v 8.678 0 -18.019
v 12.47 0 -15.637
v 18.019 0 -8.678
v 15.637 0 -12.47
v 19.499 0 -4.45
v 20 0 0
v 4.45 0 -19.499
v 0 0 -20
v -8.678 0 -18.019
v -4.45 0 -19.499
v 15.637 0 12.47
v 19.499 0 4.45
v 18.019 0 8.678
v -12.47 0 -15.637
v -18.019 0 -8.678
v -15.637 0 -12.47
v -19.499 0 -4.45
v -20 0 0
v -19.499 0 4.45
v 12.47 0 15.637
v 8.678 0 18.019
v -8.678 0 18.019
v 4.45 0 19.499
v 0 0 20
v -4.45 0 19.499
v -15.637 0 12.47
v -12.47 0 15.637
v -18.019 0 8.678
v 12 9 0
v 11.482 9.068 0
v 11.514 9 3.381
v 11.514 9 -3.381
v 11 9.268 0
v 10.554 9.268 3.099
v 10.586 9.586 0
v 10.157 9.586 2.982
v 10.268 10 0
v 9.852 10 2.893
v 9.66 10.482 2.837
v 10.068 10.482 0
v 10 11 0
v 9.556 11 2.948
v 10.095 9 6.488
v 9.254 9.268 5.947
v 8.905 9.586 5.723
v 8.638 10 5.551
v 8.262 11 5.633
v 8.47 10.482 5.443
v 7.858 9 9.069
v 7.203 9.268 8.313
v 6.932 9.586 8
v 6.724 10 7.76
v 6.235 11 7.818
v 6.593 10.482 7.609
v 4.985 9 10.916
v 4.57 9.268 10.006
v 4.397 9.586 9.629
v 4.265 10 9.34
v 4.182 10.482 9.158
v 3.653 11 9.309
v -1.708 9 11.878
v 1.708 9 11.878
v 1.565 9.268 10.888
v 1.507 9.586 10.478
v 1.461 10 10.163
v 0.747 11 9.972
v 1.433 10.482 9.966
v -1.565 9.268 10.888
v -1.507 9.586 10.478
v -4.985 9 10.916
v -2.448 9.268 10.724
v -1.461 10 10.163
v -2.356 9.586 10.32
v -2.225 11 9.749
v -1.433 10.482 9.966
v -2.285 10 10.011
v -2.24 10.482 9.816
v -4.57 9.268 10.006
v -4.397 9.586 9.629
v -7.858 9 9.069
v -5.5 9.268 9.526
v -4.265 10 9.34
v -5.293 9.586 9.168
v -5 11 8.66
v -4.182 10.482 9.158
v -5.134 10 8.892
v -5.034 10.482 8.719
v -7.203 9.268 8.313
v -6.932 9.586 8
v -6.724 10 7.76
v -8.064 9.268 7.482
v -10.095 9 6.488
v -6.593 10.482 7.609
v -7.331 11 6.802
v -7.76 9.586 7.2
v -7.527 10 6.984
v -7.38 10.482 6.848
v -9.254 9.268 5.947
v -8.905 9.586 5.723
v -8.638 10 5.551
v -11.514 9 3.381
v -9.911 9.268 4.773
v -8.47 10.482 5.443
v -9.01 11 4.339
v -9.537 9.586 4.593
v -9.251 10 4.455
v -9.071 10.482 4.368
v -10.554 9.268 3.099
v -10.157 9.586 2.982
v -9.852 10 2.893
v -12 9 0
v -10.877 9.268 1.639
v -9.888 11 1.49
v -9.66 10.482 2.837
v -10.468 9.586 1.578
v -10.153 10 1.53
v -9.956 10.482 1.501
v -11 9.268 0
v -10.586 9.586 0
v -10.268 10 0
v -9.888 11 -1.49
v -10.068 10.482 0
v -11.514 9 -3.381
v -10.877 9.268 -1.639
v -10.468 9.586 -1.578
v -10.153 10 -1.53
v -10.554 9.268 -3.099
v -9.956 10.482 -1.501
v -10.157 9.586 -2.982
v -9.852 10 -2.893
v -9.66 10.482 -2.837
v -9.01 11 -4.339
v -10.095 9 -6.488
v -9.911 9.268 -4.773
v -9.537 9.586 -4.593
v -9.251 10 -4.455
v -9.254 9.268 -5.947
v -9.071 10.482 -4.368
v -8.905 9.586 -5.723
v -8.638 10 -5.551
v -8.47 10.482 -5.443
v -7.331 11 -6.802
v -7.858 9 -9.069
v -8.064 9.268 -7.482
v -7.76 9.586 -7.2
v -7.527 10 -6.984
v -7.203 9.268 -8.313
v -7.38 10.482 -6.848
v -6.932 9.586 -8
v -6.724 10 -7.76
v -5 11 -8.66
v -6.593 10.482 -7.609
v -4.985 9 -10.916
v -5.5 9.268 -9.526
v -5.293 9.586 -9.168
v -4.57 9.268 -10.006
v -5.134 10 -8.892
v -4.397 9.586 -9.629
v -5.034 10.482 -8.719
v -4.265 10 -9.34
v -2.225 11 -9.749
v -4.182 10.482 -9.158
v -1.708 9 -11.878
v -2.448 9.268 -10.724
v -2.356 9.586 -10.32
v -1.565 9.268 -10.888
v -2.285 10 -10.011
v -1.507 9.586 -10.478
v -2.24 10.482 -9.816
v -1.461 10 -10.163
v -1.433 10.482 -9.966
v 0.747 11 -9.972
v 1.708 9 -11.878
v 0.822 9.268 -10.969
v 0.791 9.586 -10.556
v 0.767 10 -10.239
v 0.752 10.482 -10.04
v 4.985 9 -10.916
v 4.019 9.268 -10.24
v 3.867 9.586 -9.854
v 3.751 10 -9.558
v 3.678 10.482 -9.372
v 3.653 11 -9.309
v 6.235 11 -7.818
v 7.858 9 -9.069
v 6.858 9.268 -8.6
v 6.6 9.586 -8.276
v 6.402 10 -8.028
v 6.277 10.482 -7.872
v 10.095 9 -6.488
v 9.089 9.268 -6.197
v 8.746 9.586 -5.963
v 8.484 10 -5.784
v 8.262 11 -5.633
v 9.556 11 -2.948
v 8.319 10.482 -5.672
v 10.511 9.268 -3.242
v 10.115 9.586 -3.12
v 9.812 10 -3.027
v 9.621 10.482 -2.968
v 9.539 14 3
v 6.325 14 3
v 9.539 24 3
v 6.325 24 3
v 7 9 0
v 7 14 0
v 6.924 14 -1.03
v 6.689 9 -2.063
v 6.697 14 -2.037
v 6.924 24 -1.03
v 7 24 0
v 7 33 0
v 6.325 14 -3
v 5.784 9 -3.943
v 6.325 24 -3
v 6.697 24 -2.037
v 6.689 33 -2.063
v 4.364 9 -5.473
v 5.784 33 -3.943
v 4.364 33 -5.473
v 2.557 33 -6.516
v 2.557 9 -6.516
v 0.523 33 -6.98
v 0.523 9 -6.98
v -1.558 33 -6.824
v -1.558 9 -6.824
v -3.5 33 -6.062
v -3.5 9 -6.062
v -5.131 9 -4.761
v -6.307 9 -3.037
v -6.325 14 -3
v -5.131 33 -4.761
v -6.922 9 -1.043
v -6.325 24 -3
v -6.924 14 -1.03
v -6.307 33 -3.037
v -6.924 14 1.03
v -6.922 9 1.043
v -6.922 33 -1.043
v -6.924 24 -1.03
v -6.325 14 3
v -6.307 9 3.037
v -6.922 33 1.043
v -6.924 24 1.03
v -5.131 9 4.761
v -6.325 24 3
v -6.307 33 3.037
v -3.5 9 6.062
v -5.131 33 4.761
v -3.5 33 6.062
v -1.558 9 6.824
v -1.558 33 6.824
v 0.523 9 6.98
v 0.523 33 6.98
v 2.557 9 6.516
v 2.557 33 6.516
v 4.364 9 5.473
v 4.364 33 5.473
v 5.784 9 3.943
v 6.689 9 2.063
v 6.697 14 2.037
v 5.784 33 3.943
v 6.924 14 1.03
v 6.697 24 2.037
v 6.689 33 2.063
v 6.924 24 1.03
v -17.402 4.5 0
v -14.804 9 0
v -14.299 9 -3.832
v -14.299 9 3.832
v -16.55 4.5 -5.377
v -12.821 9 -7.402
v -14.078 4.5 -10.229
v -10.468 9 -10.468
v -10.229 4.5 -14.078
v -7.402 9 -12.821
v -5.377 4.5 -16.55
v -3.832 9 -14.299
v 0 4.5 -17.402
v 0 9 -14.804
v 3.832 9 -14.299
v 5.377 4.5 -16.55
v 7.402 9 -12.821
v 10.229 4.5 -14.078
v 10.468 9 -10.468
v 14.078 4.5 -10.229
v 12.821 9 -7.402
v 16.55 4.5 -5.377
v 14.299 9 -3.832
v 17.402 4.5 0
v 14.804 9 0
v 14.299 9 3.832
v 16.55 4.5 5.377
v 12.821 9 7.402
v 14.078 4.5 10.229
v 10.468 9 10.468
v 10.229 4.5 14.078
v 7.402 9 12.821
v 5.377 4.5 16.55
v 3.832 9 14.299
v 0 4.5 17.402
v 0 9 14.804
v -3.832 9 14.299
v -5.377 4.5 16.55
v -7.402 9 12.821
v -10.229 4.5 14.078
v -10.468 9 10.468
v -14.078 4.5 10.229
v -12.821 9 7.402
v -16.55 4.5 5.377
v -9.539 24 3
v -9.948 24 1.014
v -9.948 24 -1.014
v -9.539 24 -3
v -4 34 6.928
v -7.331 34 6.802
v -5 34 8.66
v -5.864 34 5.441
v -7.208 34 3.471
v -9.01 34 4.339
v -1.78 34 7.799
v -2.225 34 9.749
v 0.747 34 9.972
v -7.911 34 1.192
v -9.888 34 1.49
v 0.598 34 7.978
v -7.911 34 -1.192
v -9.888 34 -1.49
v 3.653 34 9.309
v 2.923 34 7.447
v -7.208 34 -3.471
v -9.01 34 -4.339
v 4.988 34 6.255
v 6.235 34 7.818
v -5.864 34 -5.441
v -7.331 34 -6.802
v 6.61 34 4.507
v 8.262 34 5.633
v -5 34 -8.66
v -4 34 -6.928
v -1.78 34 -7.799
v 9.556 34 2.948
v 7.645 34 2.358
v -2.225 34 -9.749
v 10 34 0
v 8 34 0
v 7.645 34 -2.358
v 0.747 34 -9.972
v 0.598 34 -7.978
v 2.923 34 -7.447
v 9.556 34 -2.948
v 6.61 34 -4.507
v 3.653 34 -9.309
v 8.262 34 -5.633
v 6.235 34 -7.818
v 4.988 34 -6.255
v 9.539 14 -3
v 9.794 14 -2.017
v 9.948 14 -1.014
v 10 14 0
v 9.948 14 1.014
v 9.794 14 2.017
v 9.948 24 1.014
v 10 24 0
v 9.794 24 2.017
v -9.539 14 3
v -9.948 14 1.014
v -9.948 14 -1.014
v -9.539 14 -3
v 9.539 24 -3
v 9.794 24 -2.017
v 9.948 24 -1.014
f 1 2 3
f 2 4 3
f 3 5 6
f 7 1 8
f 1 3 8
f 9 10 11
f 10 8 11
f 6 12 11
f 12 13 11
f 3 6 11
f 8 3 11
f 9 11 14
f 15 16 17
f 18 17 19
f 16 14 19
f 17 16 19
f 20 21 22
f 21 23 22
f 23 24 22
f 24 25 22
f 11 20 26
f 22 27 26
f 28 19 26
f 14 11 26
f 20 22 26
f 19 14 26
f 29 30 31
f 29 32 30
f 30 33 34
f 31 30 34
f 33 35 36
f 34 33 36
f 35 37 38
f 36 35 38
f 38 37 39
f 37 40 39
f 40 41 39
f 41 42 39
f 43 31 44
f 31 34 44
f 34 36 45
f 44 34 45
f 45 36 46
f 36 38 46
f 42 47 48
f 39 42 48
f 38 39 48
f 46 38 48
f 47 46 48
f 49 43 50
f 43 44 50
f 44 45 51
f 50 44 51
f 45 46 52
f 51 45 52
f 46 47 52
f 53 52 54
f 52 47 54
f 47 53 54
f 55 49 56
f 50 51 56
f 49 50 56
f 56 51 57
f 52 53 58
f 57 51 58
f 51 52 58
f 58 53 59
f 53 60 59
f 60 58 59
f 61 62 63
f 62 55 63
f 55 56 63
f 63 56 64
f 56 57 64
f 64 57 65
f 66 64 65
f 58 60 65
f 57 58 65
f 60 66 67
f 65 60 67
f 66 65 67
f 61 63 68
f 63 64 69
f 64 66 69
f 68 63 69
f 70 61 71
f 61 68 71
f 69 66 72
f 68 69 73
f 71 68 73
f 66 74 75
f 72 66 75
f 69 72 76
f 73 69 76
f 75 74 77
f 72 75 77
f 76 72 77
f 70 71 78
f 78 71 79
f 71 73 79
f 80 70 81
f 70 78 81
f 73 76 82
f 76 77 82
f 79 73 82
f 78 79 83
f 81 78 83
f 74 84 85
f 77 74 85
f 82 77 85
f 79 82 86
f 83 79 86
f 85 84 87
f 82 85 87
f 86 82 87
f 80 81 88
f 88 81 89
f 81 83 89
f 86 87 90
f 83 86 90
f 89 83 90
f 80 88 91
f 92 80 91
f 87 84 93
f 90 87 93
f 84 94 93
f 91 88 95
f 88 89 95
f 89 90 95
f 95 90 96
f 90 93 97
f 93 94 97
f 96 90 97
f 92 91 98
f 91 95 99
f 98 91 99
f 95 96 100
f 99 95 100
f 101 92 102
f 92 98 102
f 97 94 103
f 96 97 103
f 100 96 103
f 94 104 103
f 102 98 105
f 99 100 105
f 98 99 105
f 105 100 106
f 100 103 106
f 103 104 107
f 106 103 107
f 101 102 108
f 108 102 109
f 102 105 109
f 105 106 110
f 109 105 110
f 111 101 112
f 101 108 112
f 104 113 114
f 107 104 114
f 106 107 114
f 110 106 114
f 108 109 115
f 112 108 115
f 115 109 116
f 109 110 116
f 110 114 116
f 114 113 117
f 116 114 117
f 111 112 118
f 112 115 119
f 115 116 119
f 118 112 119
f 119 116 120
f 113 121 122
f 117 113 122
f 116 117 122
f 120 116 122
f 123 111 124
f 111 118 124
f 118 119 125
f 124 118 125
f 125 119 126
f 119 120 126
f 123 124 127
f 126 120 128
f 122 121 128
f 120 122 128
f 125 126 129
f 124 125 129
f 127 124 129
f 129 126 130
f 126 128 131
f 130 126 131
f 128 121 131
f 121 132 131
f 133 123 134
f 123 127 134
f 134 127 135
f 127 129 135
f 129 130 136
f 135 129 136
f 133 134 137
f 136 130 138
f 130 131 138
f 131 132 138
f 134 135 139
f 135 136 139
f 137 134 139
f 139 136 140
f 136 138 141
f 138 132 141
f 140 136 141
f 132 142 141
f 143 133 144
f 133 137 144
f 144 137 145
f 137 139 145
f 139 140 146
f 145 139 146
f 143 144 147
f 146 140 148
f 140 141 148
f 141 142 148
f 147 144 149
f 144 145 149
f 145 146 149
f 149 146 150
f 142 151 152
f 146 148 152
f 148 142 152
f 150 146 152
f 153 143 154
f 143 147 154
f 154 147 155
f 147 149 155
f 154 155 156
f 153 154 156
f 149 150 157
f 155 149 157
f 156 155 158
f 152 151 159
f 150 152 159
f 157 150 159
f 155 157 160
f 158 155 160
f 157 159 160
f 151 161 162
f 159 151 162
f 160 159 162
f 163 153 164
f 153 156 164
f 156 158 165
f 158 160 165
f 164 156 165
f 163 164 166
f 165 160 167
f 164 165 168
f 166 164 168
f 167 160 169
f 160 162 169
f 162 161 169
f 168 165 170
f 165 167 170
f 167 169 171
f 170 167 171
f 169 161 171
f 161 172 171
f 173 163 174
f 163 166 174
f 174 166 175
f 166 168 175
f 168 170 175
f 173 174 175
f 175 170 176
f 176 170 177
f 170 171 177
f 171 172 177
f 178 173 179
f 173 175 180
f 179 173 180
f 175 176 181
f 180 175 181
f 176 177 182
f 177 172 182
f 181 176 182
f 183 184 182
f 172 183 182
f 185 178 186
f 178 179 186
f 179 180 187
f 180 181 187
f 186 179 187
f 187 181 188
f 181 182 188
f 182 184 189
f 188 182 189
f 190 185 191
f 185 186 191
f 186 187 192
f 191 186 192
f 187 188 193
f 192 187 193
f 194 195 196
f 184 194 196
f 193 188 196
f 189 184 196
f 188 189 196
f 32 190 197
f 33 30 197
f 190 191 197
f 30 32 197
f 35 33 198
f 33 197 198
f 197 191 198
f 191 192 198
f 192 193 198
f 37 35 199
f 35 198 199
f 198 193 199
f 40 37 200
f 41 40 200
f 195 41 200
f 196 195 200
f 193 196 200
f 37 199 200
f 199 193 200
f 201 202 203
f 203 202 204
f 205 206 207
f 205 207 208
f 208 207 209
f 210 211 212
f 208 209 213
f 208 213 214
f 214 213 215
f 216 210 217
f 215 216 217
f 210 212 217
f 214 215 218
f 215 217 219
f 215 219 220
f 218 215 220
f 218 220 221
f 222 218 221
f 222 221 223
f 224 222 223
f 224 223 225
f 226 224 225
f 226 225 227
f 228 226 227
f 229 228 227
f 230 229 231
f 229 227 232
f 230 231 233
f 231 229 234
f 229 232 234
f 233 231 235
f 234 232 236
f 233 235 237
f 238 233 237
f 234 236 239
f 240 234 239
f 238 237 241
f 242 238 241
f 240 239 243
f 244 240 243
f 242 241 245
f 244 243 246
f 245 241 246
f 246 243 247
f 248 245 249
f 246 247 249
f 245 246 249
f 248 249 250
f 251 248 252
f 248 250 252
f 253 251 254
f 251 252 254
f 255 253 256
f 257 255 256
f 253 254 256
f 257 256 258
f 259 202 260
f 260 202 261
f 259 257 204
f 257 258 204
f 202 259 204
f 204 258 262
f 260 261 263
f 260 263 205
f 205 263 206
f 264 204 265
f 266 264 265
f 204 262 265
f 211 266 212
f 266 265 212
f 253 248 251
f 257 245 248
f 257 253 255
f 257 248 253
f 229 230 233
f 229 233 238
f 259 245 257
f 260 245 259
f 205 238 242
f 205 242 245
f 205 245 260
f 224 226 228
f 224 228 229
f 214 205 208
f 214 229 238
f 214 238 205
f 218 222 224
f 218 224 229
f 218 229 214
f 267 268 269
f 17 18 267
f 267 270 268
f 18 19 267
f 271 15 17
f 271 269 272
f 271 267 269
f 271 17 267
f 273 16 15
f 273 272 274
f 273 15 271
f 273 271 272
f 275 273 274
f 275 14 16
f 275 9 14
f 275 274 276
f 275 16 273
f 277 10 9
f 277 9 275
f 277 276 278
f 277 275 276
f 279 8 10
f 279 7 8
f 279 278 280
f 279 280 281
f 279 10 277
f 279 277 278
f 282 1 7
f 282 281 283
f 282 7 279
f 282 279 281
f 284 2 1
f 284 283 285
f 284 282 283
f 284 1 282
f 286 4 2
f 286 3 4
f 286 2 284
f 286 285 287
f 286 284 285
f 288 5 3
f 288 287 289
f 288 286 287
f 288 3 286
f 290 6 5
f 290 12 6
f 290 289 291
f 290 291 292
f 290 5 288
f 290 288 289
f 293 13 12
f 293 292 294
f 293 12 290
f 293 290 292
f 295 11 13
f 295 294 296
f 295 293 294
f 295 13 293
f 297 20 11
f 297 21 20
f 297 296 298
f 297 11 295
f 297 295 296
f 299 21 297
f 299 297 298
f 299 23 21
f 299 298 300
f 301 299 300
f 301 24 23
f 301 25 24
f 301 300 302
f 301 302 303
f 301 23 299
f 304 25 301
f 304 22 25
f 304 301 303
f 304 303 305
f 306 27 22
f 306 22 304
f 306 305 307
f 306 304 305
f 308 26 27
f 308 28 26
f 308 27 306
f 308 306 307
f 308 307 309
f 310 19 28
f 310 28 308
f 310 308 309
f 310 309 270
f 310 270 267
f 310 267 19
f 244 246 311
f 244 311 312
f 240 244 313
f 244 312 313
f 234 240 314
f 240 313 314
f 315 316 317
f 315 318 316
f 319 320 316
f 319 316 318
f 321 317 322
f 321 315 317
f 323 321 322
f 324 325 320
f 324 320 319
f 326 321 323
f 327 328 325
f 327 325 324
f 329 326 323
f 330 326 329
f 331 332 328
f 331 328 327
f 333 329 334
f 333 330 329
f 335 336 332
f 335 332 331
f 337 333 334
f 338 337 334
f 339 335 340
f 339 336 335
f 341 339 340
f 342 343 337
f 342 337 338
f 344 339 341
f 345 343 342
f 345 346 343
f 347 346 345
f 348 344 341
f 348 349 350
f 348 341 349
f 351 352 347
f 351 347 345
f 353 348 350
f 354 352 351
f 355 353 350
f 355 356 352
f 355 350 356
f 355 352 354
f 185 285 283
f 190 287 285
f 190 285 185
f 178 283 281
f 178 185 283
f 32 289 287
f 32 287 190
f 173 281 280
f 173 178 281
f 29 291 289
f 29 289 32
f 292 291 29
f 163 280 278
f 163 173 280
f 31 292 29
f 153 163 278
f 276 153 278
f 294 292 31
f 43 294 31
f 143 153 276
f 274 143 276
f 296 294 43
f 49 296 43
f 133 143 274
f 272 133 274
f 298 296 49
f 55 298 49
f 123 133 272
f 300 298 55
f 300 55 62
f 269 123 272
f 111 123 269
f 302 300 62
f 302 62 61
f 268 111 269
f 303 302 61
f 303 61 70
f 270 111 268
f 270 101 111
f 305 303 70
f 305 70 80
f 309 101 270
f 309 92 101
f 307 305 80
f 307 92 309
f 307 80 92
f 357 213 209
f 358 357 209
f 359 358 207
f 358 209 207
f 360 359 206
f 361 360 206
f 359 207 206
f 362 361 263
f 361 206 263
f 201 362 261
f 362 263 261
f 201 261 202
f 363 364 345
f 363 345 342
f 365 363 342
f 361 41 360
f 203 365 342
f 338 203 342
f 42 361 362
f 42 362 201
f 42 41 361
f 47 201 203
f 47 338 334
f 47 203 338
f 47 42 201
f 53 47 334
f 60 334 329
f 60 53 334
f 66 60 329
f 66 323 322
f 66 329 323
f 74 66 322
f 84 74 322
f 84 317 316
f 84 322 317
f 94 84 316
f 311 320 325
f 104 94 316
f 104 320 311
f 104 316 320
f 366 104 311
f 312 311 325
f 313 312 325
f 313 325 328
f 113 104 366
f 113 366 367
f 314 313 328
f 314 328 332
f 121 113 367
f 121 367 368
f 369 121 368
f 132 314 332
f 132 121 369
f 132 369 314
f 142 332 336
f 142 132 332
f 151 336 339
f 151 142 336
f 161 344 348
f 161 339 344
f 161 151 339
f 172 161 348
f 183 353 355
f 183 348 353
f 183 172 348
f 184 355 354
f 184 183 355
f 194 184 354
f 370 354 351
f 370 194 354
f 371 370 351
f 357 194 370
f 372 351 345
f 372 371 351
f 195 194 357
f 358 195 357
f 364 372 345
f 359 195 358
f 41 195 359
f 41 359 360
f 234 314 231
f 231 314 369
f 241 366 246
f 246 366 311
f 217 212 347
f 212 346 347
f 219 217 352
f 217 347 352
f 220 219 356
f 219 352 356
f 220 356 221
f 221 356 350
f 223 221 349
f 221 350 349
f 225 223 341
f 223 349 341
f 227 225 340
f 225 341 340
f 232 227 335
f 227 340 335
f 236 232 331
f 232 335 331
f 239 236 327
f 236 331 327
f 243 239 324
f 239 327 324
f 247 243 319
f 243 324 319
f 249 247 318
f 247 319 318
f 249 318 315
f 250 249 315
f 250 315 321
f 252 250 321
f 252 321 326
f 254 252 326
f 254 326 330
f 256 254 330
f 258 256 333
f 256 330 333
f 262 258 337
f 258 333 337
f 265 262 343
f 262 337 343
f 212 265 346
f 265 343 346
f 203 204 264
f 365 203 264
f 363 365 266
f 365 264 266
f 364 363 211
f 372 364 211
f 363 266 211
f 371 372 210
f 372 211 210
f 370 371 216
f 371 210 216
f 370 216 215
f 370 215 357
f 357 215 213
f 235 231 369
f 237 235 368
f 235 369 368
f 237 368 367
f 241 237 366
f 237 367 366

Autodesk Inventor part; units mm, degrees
ref_plane "YZ Plane" through (0, 0, 0) normal (1, 0, 0) x (0, 1, 0)
ref_plane "XZ Plane" through (0, 0, 0) normal (0, 1, 0) x (-1, 0, 0)
ref_plane "XY Plane" through (0, 0, 0) normal (0, 0, 1) x (1, 0, 0)
sketch "Sketch1" plane through (0, 0, 0) normal (0, 1, 0) x (-1, 0, 0)
  circle A0 centre (0, 0) radius 20
  dimension "d0" = 40
extrude "Extrusion1" add sketch "Sketch1" along normal blind 9 draft -30
sketch "Sketch2" plane through (0, 9, 0) normal (0, 1, 0) x (1, 0, 0)
  circle A0 centre (0, 0) radius 10
  dimension "d3" = 20
extrude "Extrusion2" add sketch "Sketch2" along normal blind 25
sketch "Sketch3" plane through (0, 34, 0) normal (0, 1, 0) x (1, 0, 0)
  circle A0 centre (0, 0) radius 7
  dimension "d6" = 14
extrude "Extrusion3" cut sketch "Sketch3" against normal up to surface (25 mm away)
sketch "Sketch4" plane through (0, 0, 0) normal (1, 0, 0) x (0, 1, 0)
  line L0 (24, -3) -> (14, -3)
  line L1 (14, -3) -> (14, 3)
  line L2 (14, 3) -> (24, 3)
  line L3 (24, 3) -> (24, -3)
  line L4 (9, 7) -> (9, -7) projected
  point P0 (0, 0)
  dimension "d9" = 10
  dimension "d10" = 6
  dimension "d11" = 3
  dimension "d12" = 5
extrude "Extrusion4" cut sketch "Sketch4" along normal through all both and the other way through all
fillet "Fillet1" radius 2 1 edges at (-10, 9, 0)
chamfer "Chamfer1" distance 1 angle 45 1 edges at (-7, 34, 0)
properties part number "Foot Stamp"
